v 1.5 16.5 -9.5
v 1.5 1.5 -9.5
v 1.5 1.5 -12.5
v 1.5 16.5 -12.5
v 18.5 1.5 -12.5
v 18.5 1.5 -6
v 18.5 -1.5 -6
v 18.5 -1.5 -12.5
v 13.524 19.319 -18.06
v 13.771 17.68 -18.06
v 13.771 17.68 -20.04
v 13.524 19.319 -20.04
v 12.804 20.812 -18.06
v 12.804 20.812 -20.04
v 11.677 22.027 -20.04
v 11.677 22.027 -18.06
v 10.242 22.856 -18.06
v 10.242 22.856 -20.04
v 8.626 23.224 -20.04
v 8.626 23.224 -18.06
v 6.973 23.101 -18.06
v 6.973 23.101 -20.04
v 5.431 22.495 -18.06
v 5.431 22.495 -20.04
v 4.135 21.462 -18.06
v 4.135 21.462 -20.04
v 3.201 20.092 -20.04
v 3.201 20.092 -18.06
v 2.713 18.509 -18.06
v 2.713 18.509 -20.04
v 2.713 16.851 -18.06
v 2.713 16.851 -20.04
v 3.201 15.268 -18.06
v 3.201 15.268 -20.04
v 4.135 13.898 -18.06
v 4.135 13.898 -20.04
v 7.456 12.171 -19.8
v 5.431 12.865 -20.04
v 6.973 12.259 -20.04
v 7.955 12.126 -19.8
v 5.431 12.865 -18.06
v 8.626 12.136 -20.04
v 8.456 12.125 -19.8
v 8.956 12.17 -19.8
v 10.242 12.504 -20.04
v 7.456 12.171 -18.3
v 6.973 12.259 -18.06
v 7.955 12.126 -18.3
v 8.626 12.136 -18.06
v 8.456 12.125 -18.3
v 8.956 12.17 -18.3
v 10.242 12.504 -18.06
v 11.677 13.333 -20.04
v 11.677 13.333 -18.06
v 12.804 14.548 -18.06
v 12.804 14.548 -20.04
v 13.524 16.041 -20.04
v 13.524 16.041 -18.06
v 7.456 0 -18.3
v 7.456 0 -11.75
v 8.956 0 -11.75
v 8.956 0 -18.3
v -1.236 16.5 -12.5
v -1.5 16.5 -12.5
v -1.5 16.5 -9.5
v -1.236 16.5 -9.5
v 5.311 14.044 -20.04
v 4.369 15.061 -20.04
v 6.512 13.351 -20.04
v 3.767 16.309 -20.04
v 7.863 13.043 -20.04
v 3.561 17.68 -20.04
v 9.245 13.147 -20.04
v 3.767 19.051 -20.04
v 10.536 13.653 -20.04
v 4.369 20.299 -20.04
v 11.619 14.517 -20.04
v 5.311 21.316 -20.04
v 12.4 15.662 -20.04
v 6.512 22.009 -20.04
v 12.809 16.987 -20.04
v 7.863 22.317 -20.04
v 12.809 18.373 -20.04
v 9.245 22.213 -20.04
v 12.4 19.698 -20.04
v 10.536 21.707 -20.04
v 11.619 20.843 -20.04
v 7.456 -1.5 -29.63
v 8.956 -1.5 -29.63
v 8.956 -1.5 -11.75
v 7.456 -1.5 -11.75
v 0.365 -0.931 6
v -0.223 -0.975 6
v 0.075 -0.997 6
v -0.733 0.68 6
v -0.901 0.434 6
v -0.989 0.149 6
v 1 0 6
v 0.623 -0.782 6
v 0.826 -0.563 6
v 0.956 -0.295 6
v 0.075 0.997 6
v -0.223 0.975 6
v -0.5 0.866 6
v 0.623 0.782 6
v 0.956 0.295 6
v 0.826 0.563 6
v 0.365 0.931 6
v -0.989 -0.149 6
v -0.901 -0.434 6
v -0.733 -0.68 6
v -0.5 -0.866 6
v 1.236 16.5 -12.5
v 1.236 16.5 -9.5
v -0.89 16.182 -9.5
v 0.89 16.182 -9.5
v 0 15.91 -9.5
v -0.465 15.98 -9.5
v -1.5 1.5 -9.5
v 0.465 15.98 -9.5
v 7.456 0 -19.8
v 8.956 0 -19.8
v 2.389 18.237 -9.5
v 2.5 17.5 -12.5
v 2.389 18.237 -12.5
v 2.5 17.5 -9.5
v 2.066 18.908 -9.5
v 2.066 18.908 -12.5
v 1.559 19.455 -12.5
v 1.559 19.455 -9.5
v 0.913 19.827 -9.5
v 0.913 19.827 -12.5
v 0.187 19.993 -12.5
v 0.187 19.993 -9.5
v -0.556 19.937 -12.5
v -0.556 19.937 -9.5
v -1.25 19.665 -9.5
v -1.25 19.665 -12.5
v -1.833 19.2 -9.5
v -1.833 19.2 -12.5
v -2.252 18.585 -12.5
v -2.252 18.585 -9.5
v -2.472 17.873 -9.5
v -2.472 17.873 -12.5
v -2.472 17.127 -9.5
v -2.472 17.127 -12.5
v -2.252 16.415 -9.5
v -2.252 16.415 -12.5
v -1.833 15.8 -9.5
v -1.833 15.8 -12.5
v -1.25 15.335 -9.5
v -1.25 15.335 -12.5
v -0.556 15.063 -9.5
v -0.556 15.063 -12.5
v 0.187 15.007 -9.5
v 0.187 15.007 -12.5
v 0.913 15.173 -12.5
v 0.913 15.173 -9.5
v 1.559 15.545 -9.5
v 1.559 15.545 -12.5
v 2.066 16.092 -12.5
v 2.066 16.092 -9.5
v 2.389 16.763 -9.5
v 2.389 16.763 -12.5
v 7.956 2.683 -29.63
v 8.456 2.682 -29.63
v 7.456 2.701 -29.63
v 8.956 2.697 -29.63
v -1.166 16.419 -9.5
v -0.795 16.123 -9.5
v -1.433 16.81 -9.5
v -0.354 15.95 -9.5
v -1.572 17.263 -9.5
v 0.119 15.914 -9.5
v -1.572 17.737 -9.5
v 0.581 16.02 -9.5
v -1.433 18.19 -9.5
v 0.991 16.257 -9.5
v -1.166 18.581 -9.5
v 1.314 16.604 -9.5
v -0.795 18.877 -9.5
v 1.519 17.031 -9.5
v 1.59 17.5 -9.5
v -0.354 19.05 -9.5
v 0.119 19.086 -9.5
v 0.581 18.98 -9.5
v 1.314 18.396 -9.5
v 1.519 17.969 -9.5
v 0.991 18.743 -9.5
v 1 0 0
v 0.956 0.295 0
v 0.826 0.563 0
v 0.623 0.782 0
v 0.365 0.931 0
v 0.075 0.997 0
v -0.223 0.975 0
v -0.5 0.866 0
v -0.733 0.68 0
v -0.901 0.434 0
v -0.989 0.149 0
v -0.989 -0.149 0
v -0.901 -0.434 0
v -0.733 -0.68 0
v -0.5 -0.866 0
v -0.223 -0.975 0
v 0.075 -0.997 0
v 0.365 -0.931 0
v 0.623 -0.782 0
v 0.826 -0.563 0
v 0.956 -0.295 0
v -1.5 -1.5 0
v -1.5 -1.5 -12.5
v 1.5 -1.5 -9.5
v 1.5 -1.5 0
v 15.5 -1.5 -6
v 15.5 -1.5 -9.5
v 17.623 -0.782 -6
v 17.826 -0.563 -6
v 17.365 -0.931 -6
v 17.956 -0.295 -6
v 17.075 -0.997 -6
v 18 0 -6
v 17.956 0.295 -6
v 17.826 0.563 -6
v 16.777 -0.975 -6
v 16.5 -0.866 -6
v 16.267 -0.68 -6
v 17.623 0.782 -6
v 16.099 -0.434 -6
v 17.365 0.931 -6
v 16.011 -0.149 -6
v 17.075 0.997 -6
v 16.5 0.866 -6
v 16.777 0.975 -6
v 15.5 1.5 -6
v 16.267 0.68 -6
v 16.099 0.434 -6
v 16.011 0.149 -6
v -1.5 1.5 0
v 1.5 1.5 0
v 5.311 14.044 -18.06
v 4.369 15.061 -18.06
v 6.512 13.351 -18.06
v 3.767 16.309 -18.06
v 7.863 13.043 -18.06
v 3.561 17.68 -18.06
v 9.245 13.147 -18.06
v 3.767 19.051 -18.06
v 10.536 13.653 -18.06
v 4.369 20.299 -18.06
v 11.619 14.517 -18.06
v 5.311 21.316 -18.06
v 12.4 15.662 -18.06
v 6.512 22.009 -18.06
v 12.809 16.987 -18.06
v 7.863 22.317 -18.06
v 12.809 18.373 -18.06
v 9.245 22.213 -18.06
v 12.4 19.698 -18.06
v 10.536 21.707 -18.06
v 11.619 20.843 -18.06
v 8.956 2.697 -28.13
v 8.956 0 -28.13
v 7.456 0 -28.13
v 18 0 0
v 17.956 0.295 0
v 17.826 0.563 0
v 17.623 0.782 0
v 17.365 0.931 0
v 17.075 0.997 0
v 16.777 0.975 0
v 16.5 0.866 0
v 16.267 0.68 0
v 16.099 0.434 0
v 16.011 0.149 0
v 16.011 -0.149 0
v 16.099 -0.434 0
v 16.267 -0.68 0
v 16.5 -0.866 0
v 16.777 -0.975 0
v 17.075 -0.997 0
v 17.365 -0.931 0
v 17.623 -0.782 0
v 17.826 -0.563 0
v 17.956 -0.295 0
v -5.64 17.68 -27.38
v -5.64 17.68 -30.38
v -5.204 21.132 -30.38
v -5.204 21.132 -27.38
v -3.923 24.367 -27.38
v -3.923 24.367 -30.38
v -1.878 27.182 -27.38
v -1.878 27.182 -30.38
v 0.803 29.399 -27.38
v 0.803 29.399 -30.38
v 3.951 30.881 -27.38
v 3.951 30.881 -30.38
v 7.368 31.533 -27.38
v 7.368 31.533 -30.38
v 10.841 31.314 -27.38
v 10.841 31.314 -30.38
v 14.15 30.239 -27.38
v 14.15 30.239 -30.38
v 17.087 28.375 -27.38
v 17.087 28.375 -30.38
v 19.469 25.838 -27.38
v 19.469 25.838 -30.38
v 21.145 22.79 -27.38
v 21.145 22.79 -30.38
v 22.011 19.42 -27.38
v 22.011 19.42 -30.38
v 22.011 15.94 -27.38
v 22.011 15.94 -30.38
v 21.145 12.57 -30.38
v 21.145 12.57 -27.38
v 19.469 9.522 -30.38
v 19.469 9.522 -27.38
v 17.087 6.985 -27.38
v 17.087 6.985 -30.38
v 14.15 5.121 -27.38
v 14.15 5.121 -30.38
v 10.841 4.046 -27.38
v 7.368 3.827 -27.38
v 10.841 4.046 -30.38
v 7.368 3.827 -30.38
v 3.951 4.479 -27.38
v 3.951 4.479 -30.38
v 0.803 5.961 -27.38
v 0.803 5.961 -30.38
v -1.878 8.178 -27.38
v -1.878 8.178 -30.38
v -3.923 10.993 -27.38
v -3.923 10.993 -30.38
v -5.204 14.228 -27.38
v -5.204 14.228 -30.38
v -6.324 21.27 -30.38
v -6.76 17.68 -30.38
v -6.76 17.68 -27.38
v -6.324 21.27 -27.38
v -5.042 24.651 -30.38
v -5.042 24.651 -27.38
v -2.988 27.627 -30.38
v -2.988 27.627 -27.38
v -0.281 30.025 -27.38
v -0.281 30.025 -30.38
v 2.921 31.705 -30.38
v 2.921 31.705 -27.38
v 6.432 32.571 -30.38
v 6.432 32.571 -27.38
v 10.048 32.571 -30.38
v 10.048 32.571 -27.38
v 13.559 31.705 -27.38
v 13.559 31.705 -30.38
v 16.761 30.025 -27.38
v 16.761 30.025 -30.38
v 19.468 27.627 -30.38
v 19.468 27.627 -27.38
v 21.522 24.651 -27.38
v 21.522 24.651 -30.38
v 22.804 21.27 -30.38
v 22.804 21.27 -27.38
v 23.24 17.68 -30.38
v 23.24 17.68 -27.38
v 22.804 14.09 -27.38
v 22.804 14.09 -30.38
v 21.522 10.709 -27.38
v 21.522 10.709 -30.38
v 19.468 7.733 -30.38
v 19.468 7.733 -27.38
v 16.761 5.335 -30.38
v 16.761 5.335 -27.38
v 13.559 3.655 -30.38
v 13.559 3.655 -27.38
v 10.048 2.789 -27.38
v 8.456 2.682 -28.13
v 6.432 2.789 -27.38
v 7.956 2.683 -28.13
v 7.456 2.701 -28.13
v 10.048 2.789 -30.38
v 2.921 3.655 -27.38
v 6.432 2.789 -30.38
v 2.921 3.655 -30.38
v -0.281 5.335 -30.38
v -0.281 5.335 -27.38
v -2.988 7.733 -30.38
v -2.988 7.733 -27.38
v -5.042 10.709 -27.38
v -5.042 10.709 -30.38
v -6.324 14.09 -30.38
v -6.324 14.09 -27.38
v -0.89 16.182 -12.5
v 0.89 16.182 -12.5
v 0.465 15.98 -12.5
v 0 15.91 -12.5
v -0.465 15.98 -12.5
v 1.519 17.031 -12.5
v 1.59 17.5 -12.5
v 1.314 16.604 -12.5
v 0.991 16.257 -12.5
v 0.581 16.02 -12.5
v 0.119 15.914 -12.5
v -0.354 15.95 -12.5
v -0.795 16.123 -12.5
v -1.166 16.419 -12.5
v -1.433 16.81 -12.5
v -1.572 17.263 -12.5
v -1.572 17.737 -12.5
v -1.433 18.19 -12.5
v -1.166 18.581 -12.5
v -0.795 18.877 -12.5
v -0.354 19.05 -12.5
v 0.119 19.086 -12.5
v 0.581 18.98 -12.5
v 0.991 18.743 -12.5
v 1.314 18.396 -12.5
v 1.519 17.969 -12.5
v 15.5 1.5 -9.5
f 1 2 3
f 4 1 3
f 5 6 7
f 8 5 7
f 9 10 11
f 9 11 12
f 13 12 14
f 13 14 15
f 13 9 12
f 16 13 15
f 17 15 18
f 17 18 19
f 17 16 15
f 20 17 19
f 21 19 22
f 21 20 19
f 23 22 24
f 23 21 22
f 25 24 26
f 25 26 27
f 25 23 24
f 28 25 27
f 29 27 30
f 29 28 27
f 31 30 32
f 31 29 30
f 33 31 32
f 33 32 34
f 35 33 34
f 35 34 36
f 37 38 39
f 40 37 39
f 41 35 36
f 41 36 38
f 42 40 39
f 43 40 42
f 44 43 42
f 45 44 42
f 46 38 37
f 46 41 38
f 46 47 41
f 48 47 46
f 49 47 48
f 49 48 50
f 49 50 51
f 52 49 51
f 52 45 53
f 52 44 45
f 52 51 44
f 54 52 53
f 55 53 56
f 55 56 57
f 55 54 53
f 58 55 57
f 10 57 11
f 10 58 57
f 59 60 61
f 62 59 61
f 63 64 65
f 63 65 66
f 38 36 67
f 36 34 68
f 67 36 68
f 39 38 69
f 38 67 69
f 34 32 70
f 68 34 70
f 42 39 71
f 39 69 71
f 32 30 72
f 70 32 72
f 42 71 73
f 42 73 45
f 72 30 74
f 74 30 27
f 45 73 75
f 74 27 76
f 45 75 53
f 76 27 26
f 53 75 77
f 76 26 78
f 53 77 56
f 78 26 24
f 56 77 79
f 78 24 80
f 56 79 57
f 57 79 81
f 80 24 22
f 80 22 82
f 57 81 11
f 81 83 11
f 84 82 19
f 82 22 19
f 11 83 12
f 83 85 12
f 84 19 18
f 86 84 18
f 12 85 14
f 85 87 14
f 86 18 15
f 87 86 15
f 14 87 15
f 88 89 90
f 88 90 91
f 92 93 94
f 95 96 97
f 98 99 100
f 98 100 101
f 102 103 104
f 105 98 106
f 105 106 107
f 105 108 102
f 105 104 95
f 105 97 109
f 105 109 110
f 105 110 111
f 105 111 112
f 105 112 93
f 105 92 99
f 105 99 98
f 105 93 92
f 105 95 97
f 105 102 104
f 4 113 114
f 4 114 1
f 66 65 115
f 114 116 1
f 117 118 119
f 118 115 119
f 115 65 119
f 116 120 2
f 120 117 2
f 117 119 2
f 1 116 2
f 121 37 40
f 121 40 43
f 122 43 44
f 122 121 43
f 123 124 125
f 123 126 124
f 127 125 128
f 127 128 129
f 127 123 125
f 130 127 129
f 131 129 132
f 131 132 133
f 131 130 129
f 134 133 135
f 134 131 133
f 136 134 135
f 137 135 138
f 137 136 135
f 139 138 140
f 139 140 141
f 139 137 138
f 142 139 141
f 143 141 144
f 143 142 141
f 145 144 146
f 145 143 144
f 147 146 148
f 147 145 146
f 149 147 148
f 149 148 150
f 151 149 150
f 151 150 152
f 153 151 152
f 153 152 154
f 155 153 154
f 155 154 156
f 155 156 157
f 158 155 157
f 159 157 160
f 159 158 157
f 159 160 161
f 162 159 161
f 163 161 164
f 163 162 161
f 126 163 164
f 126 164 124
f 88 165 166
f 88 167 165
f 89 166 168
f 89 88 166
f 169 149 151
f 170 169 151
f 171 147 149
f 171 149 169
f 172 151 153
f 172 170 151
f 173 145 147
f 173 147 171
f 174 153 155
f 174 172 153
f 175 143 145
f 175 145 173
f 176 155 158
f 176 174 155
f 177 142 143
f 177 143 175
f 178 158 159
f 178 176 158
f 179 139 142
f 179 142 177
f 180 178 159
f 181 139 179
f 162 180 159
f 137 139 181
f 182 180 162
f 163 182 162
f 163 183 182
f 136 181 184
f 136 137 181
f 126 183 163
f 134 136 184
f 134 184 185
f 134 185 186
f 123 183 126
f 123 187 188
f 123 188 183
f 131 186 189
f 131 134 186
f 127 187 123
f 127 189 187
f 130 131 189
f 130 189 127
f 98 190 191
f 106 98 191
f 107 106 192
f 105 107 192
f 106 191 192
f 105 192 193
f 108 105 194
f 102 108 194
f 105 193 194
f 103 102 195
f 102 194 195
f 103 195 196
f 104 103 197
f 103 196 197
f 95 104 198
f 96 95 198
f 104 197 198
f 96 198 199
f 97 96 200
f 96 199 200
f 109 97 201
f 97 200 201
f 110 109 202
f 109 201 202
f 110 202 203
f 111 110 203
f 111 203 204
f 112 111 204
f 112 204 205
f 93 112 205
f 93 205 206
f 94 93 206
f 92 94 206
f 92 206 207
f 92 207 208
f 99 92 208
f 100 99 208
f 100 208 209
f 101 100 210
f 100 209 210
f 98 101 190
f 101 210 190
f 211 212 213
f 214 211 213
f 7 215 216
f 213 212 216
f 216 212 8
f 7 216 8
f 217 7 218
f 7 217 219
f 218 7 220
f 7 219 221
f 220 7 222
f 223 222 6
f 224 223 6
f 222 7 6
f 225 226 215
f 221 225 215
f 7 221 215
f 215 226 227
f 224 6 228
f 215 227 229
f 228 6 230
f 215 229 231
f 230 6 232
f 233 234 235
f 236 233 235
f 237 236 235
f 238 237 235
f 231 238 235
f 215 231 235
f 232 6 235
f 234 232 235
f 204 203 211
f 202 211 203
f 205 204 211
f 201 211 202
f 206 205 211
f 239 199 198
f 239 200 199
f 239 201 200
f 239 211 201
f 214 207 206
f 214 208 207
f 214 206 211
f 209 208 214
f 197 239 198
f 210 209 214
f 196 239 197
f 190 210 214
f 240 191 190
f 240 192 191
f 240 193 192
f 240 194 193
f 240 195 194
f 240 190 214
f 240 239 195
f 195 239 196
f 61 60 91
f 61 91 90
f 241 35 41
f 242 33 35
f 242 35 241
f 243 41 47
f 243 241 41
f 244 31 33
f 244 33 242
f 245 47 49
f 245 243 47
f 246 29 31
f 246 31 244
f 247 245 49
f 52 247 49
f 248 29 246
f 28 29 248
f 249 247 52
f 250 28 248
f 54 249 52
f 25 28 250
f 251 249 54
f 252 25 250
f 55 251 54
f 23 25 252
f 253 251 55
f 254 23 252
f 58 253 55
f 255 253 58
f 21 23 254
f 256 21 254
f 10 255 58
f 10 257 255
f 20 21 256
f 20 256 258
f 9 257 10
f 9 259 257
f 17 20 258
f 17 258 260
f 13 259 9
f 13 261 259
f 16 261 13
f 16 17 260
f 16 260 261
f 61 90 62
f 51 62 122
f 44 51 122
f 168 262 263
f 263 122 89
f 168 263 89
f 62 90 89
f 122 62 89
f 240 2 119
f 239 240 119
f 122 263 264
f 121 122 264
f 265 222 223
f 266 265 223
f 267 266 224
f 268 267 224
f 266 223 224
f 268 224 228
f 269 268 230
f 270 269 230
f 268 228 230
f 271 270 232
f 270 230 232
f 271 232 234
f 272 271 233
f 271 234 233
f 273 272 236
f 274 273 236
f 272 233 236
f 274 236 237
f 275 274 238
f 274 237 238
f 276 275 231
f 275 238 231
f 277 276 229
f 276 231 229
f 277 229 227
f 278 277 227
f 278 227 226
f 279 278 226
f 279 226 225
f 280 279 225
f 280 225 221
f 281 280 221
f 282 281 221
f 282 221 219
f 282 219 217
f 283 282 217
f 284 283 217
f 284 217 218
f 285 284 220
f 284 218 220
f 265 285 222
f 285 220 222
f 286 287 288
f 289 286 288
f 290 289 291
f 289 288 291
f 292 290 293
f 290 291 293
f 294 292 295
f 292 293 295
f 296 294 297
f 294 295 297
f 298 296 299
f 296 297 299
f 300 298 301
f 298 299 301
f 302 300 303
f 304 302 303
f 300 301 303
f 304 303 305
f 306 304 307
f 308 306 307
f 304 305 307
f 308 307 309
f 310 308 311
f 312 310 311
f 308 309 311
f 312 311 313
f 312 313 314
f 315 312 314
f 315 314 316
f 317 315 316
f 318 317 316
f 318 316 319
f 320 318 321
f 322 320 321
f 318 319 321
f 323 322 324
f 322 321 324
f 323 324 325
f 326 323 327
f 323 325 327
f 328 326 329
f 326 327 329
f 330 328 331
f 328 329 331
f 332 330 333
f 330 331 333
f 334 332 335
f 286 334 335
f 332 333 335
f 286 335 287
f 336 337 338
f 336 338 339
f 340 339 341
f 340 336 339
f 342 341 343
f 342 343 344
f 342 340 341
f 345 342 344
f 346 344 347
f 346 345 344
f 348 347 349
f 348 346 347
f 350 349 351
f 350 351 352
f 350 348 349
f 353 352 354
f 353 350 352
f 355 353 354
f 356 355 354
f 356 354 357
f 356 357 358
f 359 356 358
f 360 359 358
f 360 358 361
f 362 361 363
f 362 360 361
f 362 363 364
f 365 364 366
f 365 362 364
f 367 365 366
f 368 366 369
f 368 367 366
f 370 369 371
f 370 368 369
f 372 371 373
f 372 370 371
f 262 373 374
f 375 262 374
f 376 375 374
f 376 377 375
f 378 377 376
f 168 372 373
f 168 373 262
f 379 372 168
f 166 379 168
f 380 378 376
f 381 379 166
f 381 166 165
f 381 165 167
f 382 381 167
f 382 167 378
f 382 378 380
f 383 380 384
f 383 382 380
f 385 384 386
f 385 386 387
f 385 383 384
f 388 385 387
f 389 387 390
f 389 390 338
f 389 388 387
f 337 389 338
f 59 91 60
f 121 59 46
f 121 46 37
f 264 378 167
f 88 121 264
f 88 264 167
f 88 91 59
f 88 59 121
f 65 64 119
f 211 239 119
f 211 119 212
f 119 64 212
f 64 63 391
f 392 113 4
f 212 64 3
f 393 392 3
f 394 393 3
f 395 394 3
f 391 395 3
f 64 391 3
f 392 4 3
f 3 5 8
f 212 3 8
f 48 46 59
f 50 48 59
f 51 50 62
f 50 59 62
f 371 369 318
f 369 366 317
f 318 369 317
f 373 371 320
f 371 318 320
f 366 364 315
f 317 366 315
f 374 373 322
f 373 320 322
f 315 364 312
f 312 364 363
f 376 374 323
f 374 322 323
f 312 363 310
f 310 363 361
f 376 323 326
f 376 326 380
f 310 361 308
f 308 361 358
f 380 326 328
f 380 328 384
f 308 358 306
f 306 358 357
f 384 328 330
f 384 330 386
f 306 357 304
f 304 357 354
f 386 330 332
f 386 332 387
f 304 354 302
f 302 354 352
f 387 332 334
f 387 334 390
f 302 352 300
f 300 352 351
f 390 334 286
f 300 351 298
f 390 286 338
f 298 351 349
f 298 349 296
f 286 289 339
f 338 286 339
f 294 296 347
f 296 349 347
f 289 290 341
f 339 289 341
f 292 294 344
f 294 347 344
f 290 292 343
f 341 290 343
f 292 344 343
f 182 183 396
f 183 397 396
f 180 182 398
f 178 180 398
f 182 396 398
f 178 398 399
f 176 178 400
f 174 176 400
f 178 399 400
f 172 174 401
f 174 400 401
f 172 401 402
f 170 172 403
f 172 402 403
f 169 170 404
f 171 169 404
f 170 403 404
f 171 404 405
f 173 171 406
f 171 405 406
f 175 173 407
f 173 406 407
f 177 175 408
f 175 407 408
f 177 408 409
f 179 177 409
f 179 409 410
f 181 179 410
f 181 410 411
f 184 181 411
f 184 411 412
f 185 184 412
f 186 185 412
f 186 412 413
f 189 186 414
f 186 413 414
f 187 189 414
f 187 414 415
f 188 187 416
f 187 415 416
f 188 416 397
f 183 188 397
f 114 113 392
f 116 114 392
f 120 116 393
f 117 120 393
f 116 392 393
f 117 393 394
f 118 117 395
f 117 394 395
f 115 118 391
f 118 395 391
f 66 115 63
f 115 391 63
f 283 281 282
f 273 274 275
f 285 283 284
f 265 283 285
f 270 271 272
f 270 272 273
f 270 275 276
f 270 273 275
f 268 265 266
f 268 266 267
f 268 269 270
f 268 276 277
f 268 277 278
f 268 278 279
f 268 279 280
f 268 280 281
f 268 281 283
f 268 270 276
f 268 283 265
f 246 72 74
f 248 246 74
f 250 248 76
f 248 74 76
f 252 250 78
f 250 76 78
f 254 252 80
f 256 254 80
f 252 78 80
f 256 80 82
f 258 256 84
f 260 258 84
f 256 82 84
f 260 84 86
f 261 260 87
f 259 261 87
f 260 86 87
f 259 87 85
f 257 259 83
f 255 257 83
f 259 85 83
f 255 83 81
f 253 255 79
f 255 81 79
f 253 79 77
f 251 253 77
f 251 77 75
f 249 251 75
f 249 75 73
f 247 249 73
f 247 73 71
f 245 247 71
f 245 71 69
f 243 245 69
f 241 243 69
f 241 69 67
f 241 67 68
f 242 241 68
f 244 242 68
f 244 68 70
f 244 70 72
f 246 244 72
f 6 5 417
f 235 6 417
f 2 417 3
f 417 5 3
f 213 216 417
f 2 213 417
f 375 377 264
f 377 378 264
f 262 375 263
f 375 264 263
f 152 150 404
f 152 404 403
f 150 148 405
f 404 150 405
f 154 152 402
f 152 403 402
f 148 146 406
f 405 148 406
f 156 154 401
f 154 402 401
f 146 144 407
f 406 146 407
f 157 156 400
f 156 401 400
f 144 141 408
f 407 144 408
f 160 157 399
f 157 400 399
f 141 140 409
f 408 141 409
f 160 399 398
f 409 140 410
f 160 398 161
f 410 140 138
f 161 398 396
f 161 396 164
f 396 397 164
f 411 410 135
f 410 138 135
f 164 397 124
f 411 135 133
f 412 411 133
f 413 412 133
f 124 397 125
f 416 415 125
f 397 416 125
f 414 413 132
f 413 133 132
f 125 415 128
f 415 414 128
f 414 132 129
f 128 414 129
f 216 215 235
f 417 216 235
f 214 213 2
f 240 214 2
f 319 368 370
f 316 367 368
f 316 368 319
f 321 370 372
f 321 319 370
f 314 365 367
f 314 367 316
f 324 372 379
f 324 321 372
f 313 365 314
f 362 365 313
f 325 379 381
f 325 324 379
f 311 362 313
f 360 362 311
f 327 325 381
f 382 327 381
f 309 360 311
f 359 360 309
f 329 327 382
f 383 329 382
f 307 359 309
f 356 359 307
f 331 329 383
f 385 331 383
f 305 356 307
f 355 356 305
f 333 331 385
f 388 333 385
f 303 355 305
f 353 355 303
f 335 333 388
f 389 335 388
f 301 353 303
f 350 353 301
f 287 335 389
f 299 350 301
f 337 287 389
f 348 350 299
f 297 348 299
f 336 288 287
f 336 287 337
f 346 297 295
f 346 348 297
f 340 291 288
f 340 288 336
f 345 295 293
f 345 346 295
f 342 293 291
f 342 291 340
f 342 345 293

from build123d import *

# Parameters (mm, degrees)
SKETCH3_W            = 3
SKETCH3_H            = 3
SKETCH7_W            = 3
SKETCH7_H            = 3
BOSS_EXTRUDE1_DEPTH  = 16.5
SKETCH12_R           = 2.5
BOSS_EXTRUDE4_DEPTH  = 1.5
SKETCH17_R           = 1
BOSS_EXTRUDE5_DEPTH  = 6
SKETCH18_R           = 1
BOSS_EXTRUDE6_DEPTH  = 6
SKETCH19_W           = 1.5
SKETCH19_H           = 1.5
BOSS_EXTRUDE7_DEPTH  = 8.05
SKETCH21_W           = 1.5
SKETCH21_H           = 1.5
BOSS_EXTRUDE8_DEPTH  = 17.68
SKETCH22_R           = 5.56
BOSS_EXTRUDE9_DEPTH  = 0.99
SKETCH23_R           = 4.65
CUT_EXTRUDE2_DEPTH   = 5
SKETCH24_W           = 1.5
SKETCH24_H           = 1.5
BOSS_EXTRUDE10_DEPTH = 9.83
SKETCH25_W           = 1.5
SKETCH25_H           = 1.5
BOSS_EXTRUDE11_DEPTH = 3
SKETCH27_R           = 15
BOSS_EXTRUDE12_DEPTH = 1.5
SKETCH28_R           = 13.88
CUT_EXTRUDE3_DEPTH   = 3
SKETCH16_R           = 1.59
CUT_EXTRUDE9_DEPTH   = 5


with BuildPart() as part:
    # Sweep3: sweep along a path in Sketch4
    with BuildLine(Plane(origin=(0, 0, 0), x_dir=(1, 0, 0), z_dir=(0, 1, 0))) as sweep3_path:
        Line((0, 0), (0, 11))
        Line((0, 11), (17, 11))
        Line((17, 11), (17, 6))
    # Sketch3 → Sweep3 (sweep)
    with BuildSketch(Plane.XY):
        Rectangle(SKETCH3_W, SKETCH3_H)
    sweep(path=sweep3_path.line, transition=Transition.RIGHT)

    # Sketch7 → Boss-Extrude1 (add)
    with BuildSketch(Plane(origin=(0, 0, 0), x_dir=(1, 0, 0), z_dir=(0, 1, 0))):
        with Locations((0, 11)):
            Rectangle(SKETCH7_W, SKETCH7_H)
    extrude(amount=BOSS_EXTRUDE1_DEPTH)

    # Sketch17 → Boss-Extrude5 (add)
    with BuildSketch(Plane.XY):
        Circle(SKETCH17_R)
    extrude(amount=BOSS_EXTRUDE5_DEPTH)

    # Sketch18 → Boss-Extrude6 (add)
    with BuildSketch(Plane.XY.offset(-6)):
        with Locations((17, 0)):
            Circle(SKETCH18_R)
    extrude(amount=BOSS_EXTRUDE6_DEPTH)


with BuildPart() as body_2:
    # Sketch12 → Boss-Extrude4 (new, symmetric)
    with BuildSketch(Plane.XY.offset(-11)):
        with Locations((0, 17.5)):
            Circle(SKETCH12_R)
    extrude(amount=BOSS_EXTRUDE4_DEPTH, both=True)


with BuildPart() as body_3:
    # Sketch19 → Boss-Extrude7 (new body)
    with BuildSketch(Plane.XY.offset(-11.75)):
        with Locations((8.205796732, -0.75)):
            Rectangle(SKETCH19_W, SKETCH19_H)
    extrude(amount=-BOSS_EXTRUDE7_DEPTH)

    # Sketch21 → Boss-Extrude8 (add)
    with BuildSketch(Plane(origin=(0, 0, 0), x_dir=(1, 0, 0), z_dir=(0, 1, 0))):
        with Locations((8.205796732, 19.05)):
            Rectangle(SKETCH21_W, SKETCH21_H)
    extrude(amount=BOSS_EXTRUDE8_DEPTH)

    # Sketch22 → Boss-Extrude9 (add, symmetric)
    with BuildSketch(Plane.XY.offset(-19.05)):
        with Locations((8.210603396, 17.679999347)):
            Circle(SKETCH22_R)
    extrude(amount=BOSS_EXTRUDE9_DEPTH, both=True)

    # Sketch23 → Cut-Extrude2 (cut)
    with BuildSketch(Plane(origin=(0, 0, -20.04), x_dir=(-1, 0, 0), z_dir=(0, 0, -1))):
        with Locations((-8.210603396, 17.679999347)):
            Circle(SKETCH23_R)
    extrude(amount=-CUT_EXTRUDE2_DEPTH, mode=Mode.SUBTRACT)

    # Sketch24 → Boss-Extrude10 (add)
    with BuildSketch(Plane(origin=(0, 0, -19.8), x_dir=(-1, 0, 0), z_dir=(0, 0, -1))):
        with Locations((-8.205796732, -0.75)):
            Rectangle(SKETCH24_W, SKETCH24_H)
    extrude(amount=BOSS_EXTRUDE10_DEPTH)

    # Sketch25 → Boss-Extrude11 (add)
    with BuildSketch(Plane(origin=(0, 0, 0), x_dir=(1, 0, 0), z_dir=(0, 1, 0))):
        with Locations((8.205796732, 28.88)):
            Rectangle(SKETCH25_W, SKETCH25_H)
    extrude(amount=BOSS_EXTRUDE11_DEPTH)

    # Sketch27 → Boss-Extrude12 (add, symmetric)
    with BuildSketch(Plane(origin=(0, 0, -28.88), x_dir=(-1, 0, 0), z_dir=(0, 0, -1))):
        with Locations((-8.24, 17.68)):
            Circle(SKETCH27_R)
    extrude(amount=BOSS_EXTRUDE12_DEPTH, both=True)

    # Sketch28 → Cut-Extrude3 (cut)
    with BuildSketch(Plane(origin=(0, 0, -30.38), x_dir=(-1, 0, 0), z_dir=(0, 0, -1))):
        with Locations((-8.24, 17.68)):
            Circle(SKETCH28_R)
    extrude(amount=-CUT_EXTRUDE3_DEPTH, mode=Mode.SUBTRACT)


with BuildPart() as cut_extrude9_tool:
    # Sketch16 → Cut-Extrude9 (new, symmetric)
    with BuildSketch(Plane(origin=(0, 0, -12.5), x_dir=(-1, 0, 0), z_dir=(0, 0, -1))):
        with Locations((0, 17.5)):
            Circle(SKETCH16_R)
    extrude(amount=CUT_EXTRUDE9_DEPTH, both=True)


with BuildPart() as part_1:
    add(part.part)

    # Cut-Extrude9: cut by cut_extrude9_tool
    add(cut_extrude9_tool.part, mode=Mode.SUBTRACT)


with BuildPart() as body_2_1:
    add(body_2.part)

    # Cut-Extrude9: cut by cut_extrude9_tool
    add(cut_extrude9_tool.part, mode=Mode.SUBTRACT)


solid = Compound([body_3.part, part_1.part, body_2_1.part])
